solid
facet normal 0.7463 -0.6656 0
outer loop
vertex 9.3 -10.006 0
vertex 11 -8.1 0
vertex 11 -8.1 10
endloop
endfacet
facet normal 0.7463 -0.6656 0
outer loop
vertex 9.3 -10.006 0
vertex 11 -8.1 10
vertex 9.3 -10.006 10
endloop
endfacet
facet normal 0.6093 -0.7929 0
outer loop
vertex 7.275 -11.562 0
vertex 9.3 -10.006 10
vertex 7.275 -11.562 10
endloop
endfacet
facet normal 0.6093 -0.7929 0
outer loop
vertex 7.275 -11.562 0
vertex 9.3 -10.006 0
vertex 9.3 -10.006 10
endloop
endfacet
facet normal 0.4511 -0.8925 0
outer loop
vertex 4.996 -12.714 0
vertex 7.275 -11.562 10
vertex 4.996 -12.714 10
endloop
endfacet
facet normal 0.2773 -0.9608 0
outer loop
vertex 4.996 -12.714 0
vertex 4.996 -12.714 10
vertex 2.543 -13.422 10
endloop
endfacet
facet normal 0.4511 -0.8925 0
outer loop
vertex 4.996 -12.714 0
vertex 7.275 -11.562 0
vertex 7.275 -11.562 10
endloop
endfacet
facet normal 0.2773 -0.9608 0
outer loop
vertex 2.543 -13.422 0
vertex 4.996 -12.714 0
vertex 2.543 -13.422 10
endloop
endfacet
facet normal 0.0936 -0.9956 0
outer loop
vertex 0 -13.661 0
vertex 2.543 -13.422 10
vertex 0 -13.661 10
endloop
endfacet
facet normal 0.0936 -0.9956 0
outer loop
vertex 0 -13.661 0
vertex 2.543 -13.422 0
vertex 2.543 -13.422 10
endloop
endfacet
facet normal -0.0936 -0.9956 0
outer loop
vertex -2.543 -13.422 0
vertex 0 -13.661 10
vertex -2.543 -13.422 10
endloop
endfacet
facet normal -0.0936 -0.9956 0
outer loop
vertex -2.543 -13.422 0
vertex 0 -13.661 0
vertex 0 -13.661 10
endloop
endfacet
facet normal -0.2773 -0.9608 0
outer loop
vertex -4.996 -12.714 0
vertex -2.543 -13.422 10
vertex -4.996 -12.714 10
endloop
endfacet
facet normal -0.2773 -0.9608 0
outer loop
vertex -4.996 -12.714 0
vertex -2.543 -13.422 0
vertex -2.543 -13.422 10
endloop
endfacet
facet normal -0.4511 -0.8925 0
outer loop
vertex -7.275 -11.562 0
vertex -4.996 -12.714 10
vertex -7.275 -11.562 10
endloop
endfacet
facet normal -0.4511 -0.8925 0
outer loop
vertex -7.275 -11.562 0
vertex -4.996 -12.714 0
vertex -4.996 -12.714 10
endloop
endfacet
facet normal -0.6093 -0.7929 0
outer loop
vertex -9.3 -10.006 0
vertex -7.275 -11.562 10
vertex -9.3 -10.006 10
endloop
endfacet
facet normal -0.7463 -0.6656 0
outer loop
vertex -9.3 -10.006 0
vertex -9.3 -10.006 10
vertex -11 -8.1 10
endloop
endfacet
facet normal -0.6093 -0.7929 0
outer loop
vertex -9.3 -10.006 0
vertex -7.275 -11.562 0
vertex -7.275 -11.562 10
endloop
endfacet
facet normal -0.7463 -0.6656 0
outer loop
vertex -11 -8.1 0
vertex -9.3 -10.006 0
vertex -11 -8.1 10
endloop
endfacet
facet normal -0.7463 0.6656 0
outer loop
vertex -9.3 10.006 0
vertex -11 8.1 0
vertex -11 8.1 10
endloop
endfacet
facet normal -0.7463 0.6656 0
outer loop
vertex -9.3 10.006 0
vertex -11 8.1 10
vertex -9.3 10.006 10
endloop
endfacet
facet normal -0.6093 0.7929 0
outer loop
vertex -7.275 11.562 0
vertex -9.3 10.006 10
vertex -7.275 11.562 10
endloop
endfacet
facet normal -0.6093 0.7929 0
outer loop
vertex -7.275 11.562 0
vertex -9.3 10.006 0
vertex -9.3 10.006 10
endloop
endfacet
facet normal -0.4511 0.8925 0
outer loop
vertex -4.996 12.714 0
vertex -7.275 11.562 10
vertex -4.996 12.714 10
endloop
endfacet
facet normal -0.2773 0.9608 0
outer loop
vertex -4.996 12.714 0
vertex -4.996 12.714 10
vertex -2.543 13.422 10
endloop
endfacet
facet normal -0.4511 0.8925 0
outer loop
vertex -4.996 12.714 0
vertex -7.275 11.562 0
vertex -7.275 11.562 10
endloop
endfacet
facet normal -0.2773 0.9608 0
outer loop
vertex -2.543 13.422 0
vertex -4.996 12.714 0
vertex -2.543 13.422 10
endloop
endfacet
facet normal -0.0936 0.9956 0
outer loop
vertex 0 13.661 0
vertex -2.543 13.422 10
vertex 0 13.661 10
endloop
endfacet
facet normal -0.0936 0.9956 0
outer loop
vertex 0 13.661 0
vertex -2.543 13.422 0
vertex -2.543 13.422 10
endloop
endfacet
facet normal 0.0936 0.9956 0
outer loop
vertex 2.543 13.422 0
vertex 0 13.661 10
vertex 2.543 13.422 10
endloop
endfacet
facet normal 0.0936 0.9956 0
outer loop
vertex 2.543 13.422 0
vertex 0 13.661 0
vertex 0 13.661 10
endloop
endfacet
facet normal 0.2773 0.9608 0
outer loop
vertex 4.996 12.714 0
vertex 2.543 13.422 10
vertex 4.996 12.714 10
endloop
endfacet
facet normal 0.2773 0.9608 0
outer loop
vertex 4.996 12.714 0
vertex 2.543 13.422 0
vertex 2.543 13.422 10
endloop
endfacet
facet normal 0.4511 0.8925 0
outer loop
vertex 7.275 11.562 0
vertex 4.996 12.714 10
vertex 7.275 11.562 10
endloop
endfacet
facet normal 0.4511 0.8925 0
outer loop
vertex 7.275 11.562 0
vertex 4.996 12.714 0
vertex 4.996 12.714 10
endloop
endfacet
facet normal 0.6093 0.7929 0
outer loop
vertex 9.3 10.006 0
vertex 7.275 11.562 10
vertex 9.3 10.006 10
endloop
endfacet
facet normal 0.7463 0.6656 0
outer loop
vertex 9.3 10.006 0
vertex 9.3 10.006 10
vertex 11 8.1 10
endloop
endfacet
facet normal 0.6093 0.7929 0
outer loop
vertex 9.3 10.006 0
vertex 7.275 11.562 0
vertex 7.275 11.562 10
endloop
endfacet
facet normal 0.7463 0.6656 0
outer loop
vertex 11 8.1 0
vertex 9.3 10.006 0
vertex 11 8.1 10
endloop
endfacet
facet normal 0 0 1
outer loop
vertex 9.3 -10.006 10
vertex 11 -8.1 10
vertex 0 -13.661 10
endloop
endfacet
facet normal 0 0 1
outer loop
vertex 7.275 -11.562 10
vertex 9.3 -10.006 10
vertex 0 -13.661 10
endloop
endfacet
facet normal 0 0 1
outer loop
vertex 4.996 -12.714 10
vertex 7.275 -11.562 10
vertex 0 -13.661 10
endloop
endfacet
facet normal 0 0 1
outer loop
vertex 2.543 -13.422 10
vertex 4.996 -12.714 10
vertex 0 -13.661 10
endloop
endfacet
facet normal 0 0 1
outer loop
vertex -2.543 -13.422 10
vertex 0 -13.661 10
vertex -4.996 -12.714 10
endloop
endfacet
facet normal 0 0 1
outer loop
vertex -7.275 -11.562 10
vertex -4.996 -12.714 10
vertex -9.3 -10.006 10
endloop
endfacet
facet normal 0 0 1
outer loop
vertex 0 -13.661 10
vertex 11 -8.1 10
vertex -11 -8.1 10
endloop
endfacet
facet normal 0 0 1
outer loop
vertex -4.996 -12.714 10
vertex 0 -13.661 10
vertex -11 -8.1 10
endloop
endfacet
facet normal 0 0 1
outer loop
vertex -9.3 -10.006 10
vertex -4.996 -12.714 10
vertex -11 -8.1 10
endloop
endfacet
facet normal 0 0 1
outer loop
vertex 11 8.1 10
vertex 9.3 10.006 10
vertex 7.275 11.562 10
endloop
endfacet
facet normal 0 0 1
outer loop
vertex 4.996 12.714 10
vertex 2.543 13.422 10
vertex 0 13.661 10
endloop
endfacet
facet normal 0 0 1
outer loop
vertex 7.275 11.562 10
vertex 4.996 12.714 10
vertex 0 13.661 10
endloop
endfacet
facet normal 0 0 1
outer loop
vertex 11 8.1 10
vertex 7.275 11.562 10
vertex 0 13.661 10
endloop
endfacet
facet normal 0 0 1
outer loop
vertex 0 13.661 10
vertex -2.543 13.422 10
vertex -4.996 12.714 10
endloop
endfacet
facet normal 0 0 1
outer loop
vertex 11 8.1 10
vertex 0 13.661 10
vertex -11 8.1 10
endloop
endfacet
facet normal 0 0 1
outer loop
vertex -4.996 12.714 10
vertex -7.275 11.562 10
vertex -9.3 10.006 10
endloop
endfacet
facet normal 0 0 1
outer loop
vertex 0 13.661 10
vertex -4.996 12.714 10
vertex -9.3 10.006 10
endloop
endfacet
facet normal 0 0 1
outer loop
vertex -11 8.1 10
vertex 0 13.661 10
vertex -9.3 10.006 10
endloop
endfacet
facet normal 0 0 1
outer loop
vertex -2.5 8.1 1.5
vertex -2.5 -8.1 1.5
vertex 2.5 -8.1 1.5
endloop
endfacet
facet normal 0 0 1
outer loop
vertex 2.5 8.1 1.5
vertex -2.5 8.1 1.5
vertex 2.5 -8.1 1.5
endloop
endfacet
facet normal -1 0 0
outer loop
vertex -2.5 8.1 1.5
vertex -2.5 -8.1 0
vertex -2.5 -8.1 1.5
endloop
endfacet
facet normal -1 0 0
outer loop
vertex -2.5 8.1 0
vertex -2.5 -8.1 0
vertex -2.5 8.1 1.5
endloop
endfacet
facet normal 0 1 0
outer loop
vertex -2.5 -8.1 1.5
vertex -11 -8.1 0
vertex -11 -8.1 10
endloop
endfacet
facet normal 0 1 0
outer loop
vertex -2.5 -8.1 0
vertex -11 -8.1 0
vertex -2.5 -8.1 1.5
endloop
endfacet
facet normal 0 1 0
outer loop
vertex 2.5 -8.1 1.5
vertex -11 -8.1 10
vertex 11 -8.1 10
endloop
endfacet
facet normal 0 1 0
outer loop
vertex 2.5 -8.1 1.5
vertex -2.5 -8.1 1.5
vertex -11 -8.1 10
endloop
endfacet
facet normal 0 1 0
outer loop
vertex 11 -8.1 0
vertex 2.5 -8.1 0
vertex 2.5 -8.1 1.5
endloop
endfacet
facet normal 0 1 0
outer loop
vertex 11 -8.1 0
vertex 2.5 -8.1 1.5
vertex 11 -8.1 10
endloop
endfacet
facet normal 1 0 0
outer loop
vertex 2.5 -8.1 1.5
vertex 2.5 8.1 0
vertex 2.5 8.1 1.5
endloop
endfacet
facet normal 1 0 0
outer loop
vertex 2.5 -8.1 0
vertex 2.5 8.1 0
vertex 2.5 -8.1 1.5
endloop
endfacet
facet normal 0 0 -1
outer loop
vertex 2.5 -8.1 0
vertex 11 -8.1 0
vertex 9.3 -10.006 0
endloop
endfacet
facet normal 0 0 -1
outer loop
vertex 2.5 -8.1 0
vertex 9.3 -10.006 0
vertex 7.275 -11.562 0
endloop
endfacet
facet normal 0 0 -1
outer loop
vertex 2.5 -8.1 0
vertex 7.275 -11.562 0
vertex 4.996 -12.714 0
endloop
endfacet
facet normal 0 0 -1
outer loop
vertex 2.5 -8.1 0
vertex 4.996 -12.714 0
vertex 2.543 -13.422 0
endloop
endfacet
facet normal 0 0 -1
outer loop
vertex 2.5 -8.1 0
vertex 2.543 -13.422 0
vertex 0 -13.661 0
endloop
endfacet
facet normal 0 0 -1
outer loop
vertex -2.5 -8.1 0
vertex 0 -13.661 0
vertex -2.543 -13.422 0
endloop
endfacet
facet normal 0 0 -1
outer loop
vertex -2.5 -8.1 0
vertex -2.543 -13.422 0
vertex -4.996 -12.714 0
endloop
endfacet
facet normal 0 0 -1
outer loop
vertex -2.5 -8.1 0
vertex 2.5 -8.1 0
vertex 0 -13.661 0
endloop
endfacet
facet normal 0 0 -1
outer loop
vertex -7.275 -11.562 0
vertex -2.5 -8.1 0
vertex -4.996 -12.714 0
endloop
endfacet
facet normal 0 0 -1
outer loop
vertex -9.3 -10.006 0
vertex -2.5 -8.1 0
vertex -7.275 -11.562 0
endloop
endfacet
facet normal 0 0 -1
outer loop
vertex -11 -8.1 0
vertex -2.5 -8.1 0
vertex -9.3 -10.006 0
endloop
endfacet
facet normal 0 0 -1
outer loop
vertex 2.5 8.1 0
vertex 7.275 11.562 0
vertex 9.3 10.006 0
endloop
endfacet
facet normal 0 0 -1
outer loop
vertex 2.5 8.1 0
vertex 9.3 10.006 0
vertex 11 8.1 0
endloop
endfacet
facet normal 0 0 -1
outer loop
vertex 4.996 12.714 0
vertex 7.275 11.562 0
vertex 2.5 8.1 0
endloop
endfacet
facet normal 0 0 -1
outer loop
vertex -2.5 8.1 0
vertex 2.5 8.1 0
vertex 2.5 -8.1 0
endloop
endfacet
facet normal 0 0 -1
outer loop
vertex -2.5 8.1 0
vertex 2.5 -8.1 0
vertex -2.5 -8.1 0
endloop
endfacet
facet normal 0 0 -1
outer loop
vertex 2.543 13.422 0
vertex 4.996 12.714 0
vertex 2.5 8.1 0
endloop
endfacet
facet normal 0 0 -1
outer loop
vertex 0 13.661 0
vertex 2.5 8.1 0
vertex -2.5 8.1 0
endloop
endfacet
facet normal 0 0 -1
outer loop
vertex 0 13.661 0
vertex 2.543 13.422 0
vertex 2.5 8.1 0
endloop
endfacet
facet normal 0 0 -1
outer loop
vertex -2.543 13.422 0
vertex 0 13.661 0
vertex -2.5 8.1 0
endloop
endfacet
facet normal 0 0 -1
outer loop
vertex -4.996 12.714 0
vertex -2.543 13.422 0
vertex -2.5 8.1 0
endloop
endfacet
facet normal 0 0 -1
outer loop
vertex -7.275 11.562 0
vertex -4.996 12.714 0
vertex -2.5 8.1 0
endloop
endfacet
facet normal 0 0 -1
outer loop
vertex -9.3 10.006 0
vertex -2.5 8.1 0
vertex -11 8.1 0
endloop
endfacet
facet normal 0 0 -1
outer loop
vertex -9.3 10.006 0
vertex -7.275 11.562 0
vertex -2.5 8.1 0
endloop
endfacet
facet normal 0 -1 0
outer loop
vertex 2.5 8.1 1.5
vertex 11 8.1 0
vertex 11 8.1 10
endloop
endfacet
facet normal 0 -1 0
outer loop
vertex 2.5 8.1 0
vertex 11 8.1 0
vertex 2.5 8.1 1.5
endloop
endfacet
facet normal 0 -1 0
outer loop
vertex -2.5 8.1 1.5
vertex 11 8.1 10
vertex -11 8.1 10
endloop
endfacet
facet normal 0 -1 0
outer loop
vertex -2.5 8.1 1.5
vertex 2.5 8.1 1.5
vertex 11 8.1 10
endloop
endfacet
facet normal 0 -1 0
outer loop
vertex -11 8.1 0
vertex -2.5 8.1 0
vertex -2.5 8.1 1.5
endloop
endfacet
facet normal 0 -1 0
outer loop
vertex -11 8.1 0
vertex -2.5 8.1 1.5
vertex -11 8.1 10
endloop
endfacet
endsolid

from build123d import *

# Parameters (mm, degrees)
EXTRUDE_1_DEPTH     = 10
SKETCH_3_W          = 5
SKETCH_3_H          = 16.2
CUT_EXTRUDE_1_DEPTH = 8.5


with BuildPart() as part:
    # Эскиз2 → Бобышка-Вытянуть1 (new body)
    with BuildSketch(Plane.XY):
        with BuildLine():
            Line((-2.5, 8.1), (-11, 8.1))
            ThreePointArc((-11, 8.1), (0, 13.660527076), (11, 8.1))
            Line((11, 8.1), (2.5, 8.1))
            Line((2.5, 8.1), (2.5, -8.1))
            Line((2.5, -8.1), (11, -8.1))
            ThreePointArc((11, -8.1), (0, -13.660527076), (-11, -8.1))
            Line((-11, -8.1), (-2.5, -8.1))
            Line((-2.5, -8.1), (-2.5, 8.1))
        make_face()
    extrude(amount=EXTRUDE_1_DEPTH)

    # Эскиз3 → Вырез-Вытянуть1 (cut)
    with BuildSketch(Plane.XY.offset(10)):
        Rectangle(SKETCH_3_W, SKETCH_3_H)
    extrude(amount=-CUT_EXTRUDE_1_DEPTH, mode=Mode.SUBTRACT)


solid = part.part
